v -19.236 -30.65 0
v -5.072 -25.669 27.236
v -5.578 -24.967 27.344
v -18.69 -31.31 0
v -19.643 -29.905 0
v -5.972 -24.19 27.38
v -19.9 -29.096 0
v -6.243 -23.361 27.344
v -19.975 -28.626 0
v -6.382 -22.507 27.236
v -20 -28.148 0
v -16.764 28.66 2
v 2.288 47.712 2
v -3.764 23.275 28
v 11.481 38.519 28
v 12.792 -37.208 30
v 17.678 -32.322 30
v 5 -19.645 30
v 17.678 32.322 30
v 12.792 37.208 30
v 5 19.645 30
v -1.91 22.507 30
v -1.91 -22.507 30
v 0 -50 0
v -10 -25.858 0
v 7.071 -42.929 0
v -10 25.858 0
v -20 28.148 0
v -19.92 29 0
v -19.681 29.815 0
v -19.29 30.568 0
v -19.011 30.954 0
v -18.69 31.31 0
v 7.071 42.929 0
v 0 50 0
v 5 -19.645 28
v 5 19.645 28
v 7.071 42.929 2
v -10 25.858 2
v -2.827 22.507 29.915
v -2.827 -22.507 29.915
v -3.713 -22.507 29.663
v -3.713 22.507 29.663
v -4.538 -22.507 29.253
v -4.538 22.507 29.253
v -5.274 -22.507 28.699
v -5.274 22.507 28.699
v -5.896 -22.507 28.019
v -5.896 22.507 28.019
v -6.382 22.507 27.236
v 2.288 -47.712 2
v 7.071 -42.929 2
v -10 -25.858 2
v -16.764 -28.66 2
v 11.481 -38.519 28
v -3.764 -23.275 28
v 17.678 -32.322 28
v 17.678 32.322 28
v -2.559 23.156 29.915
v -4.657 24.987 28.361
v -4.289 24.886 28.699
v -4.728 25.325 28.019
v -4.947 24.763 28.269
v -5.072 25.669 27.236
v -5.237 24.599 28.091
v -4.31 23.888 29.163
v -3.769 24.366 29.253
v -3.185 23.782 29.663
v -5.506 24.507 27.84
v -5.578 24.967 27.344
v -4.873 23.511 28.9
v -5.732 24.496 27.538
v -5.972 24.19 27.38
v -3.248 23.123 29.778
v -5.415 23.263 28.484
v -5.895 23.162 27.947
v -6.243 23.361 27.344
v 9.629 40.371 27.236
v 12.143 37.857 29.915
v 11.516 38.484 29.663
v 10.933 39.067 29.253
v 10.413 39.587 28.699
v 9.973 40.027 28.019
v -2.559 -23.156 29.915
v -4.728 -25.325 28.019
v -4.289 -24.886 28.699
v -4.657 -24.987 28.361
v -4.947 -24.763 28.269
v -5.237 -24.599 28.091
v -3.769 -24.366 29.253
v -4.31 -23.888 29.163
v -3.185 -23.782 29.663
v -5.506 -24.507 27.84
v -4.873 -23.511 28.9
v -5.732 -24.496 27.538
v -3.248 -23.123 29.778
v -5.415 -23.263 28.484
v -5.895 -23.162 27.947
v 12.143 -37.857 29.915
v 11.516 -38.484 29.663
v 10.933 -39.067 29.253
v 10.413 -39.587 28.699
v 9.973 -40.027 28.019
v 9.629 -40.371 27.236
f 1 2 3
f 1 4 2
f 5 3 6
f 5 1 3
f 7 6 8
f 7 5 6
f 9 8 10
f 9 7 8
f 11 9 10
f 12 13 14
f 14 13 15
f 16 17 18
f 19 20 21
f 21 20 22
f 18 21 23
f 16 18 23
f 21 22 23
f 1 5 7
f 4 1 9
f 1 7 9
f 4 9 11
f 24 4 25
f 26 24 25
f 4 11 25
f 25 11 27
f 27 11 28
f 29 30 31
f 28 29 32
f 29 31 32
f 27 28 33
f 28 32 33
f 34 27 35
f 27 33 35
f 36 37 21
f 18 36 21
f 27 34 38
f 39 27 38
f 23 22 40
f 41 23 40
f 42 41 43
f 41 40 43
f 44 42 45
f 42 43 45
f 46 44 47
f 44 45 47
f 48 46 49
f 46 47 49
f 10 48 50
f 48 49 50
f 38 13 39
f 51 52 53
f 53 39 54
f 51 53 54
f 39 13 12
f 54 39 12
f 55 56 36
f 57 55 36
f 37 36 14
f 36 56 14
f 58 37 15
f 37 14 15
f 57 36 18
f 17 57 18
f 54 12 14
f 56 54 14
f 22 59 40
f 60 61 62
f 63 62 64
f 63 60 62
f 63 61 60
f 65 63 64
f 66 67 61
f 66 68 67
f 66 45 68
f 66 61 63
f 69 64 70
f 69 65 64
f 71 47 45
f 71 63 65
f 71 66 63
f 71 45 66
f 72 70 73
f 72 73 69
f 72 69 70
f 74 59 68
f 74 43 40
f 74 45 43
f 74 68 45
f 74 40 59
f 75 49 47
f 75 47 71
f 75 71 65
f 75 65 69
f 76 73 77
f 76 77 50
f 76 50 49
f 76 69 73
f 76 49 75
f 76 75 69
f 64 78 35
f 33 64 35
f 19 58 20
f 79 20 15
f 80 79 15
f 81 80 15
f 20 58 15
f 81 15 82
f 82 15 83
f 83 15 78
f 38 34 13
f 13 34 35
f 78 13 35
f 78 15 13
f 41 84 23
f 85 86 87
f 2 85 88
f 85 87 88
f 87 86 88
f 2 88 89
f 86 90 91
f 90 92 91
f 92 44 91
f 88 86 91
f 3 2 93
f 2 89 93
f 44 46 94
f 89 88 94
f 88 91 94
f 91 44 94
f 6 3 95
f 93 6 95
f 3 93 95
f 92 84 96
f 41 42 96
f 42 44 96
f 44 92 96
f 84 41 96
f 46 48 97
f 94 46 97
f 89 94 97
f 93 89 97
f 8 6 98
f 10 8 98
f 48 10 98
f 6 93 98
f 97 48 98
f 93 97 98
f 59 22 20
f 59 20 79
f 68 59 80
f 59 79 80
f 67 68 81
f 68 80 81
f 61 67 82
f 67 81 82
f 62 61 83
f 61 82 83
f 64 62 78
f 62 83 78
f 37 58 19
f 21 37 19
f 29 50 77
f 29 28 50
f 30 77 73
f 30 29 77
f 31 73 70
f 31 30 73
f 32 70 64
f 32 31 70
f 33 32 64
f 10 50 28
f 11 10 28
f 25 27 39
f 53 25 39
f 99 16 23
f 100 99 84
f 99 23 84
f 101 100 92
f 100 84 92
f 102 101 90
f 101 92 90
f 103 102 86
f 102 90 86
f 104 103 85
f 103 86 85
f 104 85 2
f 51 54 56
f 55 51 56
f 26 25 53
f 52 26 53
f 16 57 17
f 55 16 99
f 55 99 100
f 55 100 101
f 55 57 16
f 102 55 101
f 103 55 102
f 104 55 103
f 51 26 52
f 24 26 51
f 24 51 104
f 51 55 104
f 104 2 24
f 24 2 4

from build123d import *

# Parameters (mm, degrees)
F3_R = 5


with BuildPart() as f2:
    # F2: sweep along a path in F0
    with BuildLine(Plane.XY) as f2_path:
        Line((0, -50), (-20, -30))
        Line((-20, -30), (-20, 30))
        Line((-20, 30), (0, 50))
    # F1 (on Front) → F2 (sweep)
    with BuildSketch(Plane.XZ):
        Polygon((-20, 0), (-10, 0), (-10, 2), (-16.7639320225, 2), (-3.7639320225, 28), (5, 28), (5, 30), (-5, 30), align=None)
    sweep(path=f2_path.line, transition=Transition.RIGHT)

    # F3
    f3_edges = [f2.edges().sort_by_distance(p)[0] for p in [
        (-5, 0, 30),
        (2.803301, 31.590097, 30),
        (2.803301, -31.590097, 30),
        (-12.5, -26.893398, 15),
        (-12.5, 26.893398, 15),
    ]]
    fillet(f3_edges, radius=F3_R)


solid = f2.part
